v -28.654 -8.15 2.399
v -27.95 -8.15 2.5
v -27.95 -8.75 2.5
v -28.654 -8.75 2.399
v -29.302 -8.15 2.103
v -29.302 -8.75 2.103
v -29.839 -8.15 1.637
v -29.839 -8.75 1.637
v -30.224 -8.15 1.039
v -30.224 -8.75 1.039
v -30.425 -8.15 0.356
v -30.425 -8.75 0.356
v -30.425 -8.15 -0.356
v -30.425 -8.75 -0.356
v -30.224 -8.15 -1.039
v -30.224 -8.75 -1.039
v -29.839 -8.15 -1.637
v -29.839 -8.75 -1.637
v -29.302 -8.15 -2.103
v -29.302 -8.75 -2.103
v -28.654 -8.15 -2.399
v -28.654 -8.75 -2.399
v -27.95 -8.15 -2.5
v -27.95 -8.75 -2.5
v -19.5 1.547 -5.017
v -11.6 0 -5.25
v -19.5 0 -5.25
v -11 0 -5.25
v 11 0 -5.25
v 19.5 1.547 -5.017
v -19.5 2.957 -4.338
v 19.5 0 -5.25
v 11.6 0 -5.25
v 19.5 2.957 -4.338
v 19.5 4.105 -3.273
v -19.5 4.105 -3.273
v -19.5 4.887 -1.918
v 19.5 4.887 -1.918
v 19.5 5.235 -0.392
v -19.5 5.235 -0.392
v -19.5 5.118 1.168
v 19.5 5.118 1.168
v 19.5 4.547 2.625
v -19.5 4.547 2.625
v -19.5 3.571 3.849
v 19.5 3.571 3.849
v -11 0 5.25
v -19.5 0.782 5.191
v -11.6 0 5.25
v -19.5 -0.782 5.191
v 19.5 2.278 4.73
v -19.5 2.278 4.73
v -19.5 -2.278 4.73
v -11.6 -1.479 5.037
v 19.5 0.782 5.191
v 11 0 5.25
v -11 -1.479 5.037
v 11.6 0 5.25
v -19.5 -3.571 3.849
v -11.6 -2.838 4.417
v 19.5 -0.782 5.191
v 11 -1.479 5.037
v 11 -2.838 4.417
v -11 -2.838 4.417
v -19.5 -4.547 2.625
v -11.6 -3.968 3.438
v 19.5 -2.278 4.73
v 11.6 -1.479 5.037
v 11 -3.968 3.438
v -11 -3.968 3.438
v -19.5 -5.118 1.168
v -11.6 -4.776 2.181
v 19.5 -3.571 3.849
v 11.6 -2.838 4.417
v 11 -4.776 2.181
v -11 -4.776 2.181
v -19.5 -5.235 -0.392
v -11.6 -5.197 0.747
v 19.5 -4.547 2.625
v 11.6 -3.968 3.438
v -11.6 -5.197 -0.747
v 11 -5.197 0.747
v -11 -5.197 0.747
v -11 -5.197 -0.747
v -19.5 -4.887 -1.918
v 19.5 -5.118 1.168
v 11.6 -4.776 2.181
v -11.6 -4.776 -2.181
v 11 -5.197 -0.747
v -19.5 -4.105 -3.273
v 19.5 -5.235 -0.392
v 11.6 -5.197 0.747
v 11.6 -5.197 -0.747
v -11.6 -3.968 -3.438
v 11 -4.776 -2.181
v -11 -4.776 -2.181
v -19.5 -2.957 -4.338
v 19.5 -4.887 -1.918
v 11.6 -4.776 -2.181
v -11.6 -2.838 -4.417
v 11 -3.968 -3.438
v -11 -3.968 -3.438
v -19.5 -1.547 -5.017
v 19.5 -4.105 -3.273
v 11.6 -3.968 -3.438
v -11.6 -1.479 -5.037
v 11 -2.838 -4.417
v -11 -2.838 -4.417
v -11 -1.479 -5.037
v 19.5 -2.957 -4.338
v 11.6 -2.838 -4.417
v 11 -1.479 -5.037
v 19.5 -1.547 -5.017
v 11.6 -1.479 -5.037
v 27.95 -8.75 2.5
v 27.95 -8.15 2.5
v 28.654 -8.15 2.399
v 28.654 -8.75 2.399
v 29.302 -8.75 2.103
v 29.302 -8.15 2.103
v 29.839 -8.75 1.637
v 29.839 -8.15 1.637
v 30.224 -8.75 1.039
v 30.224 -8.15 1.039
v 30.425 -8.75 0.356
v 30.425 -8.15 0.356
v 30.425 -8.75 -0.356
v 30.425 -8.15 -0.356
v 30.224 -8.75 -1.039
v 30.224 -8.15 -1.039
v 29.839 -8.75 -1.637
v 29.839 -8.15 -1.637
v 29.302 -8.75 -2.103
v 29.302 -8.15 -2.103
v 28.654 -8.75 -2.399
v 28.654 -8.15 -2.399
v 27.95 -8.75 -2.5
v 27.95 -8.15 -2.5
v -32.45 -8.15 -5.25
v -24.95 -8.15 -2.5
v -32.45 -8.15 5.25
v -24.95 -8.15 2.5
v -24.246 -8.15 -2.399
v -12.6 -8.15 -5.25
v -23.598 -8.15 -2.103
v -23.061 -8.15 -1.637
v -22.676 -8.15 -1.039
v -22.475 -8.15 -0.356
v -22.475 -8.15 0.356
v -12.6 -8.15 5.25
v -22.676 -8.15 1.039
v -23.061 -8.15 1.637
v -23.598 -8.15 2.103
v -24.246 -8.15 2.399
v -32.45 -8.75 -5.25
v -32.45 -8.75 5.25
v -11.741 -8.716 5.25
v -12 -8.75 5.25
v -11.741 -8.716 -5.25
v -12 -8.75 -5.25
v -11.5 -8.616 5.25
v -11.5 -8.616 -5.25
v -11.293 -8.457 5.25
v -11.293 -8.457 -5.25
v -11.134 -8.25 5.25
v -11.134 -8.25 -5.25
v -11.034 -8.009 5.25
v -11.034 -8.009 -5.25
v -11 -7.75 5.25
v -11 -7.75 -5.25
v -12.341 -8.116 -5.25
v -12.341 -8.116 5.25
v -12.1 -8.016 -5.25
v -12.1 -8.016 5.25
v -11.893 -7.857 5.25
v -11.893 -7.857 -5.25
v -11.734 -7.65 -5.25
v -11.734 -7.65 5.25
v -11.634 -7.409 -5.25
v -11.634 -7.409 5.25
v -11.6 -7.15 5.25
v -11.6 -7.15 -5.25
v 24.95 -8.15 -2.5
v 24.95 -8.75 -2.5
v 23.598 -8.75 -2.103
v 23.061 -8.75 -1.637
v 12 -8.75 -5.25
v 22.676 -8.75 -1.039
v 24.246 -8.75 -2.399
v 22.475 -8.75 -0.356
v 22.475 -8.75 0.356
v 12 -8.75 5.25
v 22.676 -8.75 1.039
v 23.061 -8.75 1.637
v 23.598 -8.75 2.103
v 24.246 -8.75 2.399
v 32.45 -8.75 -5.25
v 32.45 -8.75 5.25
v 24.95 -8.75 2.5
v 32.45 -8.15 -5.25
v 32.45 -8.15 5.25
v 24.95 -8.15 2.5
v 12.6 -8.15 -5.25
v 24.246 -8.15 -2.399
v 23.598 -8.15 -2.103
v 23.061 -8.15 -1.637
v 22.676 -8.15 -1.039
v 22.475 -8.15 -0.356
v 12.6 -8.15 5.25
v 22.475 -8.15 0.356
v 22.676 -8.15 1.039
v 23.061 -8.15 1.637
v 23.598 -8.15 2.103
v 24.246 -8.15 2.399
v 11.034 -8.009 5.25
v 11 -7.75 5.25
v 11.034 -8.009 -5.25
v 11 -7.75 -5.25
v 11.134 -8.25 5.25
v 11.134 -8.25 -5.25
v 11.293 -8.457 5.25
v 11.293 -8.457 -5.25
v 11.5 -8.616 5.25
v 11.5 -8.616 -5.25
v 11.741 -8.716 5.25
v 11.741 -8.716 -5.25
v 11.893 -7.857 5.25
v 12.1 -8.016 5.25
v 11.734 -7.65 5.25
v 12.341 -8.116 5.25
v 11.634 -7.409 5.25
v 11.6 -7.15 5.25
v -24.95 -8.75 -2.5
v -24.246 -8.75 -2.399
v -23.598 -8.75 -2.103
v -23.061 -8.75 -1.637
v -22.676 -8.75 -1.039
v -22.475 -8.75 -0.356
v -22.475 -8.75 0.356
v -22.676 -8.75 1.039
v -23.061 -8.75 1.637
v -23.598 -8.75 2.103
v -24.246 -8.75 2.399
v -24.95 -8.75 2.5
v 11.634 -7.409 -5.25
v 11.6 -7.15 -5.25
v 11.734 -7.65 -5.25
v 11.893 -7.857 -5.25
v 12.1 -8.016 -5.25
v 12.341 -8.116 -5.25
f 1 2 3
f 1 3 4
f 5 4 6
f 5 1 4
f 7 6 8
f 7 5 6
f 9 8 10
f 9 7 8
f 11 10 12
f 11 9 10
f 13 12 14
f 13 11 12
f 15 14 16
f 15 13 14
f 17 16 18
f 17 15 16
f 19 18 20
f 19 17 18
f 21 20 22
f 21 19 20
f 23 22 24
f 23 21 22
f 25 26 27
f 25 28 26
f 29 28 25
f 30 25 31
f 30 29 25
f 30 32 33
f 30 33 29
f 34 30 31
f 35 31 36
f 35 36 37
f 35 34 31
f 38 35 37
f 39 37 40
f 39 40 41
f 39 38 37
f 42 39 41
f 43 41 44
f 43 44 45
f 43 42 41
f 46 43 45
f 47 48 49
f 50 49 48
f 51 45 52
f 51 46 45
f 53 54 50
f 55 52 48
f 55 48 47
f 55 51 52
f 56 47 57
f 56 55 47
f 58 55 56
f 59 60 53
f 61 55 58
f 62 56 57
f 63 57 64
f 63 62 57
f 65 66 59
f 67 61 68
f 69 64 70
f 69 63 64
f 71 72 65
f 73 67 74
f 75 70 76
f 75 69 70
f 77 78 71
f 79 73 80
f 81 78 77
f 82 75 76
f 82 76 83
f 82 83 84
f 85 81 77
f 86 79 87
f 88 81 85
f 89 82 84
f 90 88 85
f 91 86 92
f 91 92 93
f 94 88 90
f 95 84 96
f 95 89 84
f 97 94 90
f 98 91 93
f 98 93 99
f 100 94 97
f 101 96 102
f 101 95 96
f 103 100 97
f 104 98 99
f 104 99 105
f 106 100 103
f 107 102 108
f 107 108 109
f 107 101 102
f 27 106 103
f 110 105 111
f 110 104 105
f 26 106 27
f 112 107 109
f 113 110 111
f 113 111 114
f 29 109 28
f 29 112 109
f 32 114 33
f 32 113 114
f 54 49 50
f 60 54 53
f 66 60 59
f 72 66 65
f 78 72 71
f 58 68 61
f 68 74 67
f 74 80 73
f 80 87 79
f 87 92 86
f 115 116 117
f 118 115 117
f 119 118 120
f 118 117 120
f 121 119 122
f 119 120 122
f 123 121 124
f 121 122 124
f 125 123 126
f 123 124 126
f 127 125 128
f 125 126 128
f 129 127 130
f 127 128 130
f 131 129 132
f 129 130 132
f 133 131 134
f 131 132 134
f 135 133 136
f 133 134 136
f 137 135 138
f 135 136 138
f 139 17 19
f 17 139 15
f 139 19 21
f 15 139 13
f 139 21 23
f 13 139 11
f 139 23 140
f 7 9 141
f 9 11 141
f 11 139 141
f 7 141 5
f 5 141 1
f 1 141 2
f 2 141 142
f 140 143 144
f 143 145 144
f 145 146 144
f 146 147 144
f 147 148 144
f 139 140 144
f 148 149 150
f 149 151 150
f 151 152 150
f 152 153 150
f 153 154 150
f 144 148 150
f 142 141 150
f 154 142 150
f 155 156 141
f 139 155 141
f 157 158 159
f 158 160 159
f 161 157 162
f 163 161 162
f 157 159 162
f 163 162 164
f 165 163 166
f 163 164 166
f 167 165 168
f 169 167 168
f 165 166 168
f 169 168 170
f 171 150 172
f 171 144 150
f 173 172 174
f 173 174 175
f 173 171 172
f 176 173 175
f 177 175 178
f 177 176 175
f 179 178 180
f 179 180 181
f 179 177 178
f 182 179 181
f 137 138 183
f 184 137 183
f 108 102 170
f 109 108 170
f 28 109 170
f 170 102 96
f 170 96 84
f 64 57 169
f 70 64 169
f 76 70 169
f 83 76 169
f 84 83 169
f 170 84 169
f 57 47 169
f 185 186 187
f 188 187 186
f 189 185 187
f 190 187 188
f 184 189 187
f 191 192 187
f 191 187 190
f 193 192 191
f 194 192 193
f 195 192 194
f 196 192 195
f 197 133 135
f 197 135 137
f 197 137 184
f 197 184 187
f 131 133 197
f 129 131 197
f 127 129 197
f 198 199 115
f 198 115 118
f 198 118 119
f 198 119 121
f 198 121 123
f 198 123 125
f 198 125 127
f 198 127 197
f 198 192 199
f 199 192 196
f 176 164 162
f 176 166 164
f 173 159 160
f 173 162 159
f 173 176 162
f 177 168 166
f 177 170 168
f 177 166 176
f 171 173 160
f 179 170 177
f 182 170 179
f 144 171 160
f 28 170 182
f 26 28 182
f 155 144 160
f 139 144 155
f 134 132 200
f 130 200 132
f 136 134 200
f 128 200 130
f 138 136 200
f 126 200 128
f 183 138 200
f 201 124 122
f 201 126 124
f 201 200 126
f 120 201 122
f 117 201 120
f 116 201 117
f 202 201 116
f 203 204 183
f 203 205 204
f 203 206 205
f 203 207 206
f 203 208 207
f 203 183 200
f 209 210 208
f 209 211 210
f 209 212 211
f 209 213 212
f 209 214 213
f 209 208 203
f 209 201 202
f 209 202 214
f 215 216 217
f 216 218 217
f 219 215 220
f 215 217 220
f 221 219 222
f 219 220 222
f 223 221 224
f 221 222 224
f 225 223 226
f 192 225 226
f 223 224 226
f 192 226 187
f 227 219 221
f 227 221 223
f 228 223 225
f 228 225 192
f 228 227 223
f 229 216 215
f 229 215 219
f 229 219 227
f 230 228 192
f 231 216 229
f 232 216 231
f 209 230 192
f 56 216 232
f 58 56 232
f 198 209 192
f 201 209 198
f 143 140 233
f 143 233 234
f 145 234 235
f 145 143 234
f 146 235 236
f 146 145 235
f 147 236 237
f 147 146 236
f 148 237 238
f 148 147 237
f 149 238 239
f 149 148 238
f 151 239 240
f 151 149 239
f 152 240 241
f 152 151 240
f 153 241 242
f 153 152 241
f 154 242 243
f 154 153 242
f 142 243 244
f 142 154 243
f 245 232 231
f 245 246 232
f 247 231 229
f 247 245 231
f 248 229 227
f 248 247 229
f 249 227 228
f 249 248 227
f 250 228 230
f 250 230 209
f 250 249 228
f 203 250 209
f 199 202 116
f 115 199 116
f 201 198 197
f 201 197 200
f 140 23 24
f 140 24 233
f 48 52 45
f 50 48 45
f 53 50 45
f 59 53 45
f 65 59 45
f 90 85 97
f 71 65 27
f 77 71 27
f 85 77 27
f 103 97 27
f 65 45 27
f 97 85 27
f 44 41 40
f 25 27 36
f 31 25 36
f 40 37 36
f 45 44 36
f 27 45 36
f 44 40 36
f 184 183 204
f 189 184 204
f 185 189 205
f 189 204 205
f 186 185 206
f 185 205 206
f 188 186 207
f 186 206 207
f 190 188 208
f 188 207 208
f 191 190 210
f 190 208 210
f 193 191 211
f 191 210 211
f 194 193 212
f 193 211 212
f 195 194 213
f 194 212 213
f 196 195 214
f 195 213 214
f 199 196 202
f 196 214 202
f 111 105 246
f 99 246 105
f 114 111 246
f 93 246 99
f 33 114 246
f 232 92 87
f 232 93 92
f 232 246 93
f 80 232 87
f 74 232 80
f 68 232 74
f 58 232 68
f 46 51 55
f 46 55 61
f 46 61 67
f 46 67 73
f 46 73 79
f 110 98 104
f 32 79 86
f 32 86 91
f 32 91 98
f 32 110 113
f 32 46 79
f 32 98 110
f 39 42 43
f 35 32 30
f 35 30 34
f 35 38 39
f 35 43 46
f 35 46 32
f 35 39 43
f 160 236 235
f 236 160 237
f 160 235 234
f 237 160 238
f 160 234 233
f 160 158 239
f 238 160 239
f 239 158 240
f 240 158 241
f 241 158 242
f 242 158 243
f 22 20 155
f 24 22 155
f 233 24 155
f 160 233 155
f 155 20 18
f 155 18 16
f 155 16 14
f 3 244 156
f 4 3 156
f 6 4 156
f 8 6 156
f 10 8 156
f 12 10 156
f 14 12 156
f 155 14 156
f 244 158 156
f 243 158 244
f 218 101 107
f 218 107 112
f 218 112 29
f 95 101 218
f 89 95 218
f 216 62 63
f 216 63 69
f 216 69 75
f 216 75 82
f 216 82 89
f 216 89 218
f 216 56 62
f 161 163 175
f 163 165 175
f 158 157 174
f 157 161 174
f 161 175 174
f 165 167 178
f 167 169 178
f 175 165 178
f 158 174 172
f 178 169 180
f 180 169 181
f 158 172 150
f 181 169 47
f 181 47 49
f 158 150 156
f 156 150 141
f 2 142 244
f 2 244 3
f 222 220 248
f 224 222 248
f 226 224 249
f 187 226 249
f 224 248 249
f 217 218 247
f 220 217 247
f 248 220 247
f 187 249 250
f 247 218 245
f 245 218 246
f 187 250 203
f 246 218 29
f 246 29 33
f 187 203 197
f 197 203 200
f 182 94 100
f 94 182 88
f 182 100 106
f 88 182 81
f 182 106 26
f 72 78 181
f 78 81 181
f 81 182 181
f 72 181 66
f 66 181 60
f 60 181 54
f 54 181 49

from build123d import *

# Parameters (mm, degrees)
SKETCH1_R           = 5.25
BOSS_EXTRUDE1_DEPTH = 19.5
BOSS_EXTRUDE2_DEPTH = 10.5
FILLET1_R           = 1
CUT_EXTRUDE1_DEPTH  = 0.6


with BuildPart() as part:
    # Sketch1 → Boss-Extrude1 (new, symmetric)
    with BuildSketch(Plane(origin=(0, 0, 0), x_dir=(0, 0, -1), z_dir=(1, 0, 0))):
        Circle(SKETCH1_R)
    extrude(amount=BOSS_EXTRUDE1_DEPTH, both=True)

    # Sketch2 → Boss-Extrude2 (add)
    with BuildSketch(Plane.XY.offset(5.25)):
        Polygon((-32.45, -8.15), (-11.6, -8.15), (-11.6, 0), (-11, 0), (-11, -8.75), (-32.45, -8.75), align=None)
        Polygon((32.45, -8.15), (11.6, -8.15), (11.6, 0), (11, 0), (11, -8.75), (32.45, -8.75), align=None)
    extrude(amount=-BOSS_EXTRUDE2_DEPTH)

    # Fillet1
    fillet1_edges = [part.edges().sort_by_distance(p)[0] for p in [
        (-11, -8.75, 0),
        (-11.6, -8.15, 0),
        (11.6, -8.15, 0),
        (11, -8.75, 0),
    ]]
    fillet(fillet1_edges, radius=FILLET1_R)

    # Sketch3 → Cut-Extrude1 (cut)
    with BuildSketch(Plane(origin=(0, -8.15, 0), x_dir=(1, 0, 0), z_dir=(0, 1, 0))):
        with BuildLine():
            Line((-24.95, -2.5), (-27.95, -2.5))
            ThreePointArc((-27.95, -2.5), (-30.45, 0), (-27.95, 2.5))
            Line((-27.95, 2.5), (-24.95, 2.5))
            ThreePointArc((-24.95, 2.5), (-22.45, 0), (-24.95, -2.5))
        make_face()
        with BuildLine():
            Line((24.95, -2.5), (27.95, -2.5))
            ThreePointArc((27.95, -2.5), (30.45, 0), (27.95, 2.5))
            Line((27.95, 2.5), (24.95, 2.5))
            ThreePointArc((24.95, 2.5), (22.45, 0), (24.95, -2.5))
        make_face()
    extrude(amount=-CUT_EXTRUDE1_DEPTH, mode=Mode.SUBTRACT)


solid = part.part
